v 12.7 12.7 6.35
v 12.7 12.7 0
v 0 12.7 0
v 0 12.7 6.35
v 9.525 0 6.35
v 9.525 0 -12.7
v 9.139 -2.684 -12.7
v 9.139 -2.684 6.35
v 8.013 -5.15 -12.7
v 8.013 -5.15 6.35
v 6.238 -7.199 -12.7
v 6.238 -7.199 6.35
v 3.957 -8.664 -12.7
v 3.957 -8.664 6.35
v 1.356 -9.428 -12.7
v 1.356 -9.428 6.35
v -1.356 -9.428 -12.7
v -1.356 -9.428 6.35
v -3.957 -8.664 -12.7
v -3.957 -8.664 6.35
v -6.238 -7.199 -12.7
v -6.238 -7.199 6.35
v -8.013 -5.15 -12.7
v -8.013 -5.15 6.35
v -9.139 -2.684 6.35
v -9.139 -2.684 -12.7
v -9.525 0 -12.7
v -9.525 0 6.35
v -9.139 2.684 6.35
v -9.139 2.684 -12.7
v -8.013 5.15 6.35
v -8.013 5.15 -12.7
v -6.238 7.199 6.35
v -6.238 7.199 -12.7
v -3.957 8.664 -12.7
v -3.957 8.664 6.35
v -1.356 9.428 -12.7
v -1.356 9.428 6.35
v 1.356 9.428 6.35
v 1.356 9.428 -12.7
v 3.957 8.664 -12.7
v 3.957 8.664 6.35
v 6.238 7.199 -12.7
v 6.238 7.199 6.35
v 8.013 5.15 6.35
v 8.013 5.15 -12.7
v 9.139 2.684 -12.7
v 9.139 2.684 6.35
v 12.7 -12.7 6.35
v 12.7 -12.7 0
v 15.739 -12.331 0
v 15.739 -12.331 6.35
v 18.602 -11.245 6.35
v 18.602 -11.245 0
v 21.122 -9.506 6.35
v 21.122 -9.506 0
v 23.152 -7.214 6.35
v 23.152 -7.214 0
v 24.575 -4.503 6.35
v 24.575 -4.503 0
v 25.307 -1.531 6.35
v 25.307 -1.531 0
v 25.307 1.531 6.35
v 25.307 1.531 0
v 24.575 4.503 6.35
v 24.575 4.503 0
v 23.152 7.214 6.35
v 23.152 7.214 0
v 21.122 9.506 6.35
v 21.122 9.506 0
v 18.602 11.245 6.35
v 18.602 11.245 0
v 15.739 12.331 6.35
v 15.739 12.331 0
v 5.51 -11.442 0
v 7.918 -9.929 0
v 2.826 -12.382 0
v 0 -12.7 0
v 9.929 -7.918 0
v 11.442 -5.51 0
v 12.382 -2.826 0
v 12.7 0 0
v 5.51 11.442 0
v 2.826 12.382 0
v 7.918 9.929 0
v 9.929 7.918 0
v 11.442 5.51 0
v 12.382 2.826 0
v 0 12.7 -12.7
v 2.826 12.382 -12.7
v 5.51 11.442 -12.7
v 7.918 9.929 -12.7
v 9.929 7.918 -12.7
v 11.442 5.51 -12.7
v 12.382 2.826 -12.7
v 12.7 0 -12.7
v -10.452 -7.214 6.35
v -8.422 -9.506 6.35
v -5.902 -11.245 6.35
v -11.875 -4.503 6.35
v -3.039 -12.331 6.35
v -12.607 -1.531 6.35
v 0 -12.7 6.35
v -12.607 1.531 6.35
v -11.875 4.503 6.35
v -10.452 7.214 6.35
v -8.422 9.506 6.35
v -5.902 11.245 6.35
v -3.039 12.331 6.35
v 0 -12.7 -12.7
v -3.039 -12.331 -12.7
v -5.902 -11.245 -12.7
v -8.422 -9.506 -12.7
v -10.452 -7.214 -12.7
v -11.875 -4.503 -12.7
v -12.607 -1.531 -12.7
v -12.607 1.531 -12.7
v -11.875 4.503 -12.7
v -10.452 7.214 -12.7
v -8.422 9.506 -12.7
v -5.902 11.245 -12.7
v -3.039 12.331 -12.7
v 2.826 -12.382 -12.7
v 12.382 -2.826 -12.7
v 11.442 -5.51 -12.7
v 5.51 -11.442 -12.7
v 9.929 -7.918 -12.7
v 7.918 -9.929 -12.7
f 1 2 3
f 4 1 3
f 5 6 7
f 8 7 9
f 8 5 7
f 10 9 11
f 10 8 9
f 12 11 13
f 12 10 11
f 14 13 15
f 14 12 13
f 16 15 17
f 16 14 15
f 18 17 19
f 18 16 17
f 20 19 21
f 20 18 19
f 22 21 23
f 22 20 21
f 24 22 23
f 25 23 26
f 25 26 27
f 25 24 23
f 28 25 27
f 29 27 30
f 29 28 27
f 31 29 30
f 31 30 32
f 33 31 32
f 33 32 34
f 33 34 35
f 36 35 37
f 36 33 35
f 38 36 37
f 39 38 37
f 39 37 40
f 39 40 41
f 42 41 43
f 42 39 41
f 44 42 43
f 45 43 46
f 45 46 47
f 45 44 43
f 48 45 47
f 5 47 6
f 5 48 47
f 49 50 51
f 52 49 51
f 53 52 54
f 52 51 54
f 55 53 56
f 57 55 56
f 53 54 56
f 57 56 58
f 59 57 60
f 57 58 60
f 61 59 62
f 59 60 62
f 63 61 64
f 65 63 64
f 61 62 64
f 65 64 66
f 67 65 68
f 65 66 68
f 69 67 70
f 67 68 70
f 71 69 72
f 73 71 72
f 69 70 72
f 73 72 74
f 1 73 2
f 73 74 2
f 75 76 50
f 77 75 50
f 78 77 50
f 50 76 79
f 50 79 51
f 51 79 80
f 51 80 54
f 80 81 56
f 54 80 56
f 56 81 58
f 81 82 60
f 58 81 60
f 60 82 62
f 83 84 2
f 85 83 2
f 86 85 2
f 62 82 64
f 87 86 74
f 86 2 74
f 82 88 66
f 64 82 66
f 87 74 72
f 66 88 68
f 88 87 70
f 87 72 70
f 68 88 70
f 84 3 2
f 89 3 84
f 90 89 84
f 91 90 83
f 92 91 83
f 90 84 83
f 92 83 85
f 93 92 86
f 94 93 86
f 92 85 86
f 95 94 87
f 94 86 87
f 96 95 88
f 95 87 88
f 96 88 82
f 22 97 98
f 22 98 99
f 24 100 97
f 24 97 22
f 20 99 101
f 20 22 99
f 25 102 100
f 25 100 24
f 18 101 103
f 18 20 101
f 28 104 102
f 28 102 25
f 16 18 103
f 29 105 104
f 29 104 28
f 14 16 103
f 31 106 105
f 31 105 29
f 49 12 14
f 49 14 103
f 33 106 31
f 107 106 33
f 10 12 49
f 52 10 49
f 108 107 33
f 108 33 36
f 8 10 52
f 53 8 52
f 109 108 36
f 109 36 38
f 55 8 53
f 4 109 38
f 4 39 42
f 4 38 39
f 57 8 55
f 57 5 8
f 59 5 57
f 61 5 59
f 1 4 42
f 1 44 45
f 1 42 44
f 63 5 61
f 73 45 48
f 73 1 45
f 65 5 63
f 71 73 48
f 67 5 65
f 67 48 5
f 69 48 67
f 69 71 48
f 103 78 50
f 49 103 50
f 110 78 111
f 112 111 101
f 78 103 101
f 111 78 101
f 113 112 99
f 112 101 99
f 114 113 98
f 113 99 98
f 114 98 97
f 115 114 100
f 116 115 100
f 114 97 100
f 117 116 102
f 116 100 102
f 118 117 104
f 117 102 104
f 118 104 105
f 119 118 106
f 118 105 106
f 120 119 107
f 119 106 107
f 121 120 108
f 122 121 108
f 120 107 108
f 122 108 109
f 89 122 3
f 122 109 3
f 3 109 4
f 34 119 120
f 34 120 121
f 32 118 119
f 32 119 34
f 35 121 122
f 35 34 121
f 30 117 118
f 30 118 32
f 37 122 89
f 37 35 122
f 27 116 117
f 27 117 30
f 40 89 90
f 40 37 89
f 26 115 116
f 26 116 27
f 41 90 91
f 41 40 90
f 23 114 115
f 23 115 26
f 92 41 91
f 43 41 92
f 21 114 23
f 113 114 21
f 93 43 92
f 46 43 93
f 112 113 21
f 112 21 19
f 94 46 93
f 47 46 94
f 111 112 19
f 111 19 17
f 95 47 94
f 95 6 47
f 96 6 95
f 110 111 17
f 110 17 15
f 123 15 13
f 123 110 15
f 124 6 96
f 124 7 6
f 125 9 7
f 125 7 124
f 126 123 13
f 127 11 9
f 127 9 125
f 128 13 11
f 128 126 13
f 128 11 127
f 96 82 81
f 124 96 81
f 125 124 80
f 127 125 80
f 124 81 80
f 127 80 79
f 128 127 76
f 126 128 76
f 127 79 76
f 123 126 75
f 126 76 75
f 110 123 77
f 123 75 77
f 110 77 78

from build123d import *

# Parameters (mm, degrees)
F0_R     = 9.525
F1_DEPTH = 6.35
F2_R     = 9.525
F3_DEPTH = 12.7


# Not quite as in the source:
# - a length typed as a fraction of an inch, garbled in the dataset ("3 / 203.2 mm" for 3/8 in), is restored


with BuildPart() as f1:
    # F0 (on Top) → F1 (new body)
    with BuildSketch(Plane.XY):
        with BuildLine():
            Line((12.7, 12.7), (0, 12.7))
            ThreePointArc((0, 12.7), (-12.7, 0), (0, -12.7))
            Line((0, -12.7), (12.7, -12.7))
            ThreePointArc((12.7, -12.7), (25.4, 0), (12.7, 12.7))
        make_face()
        Circle(F0_R, mode=Mode.SUBTRACT)
    extrude(amount=F1_DEPTH)

    # F2 (on face) → F3 (join)
    with BuildSketch(Plane(origin=(0, 0, 0), x_dir=(1, 0, 0), z_dir=(0, 0, -1))):
        with BuildLine():
            ThreePointArc((0, -12.7), (8.9802561211, -8.9802561211), (12.7, 0))
            ThreePointArc((12.7, 0), (8.9802561211, 8.9802561211), (0, 12.7))
            ThreePointArc((0, 12.7), (-12.7, 0), (0, -12.7))
        make_face()
        Circle(F2_R, mode=Mode.SUBTRACT)
    extrude(amount=F3_DEPTH)


solid = f1.part
